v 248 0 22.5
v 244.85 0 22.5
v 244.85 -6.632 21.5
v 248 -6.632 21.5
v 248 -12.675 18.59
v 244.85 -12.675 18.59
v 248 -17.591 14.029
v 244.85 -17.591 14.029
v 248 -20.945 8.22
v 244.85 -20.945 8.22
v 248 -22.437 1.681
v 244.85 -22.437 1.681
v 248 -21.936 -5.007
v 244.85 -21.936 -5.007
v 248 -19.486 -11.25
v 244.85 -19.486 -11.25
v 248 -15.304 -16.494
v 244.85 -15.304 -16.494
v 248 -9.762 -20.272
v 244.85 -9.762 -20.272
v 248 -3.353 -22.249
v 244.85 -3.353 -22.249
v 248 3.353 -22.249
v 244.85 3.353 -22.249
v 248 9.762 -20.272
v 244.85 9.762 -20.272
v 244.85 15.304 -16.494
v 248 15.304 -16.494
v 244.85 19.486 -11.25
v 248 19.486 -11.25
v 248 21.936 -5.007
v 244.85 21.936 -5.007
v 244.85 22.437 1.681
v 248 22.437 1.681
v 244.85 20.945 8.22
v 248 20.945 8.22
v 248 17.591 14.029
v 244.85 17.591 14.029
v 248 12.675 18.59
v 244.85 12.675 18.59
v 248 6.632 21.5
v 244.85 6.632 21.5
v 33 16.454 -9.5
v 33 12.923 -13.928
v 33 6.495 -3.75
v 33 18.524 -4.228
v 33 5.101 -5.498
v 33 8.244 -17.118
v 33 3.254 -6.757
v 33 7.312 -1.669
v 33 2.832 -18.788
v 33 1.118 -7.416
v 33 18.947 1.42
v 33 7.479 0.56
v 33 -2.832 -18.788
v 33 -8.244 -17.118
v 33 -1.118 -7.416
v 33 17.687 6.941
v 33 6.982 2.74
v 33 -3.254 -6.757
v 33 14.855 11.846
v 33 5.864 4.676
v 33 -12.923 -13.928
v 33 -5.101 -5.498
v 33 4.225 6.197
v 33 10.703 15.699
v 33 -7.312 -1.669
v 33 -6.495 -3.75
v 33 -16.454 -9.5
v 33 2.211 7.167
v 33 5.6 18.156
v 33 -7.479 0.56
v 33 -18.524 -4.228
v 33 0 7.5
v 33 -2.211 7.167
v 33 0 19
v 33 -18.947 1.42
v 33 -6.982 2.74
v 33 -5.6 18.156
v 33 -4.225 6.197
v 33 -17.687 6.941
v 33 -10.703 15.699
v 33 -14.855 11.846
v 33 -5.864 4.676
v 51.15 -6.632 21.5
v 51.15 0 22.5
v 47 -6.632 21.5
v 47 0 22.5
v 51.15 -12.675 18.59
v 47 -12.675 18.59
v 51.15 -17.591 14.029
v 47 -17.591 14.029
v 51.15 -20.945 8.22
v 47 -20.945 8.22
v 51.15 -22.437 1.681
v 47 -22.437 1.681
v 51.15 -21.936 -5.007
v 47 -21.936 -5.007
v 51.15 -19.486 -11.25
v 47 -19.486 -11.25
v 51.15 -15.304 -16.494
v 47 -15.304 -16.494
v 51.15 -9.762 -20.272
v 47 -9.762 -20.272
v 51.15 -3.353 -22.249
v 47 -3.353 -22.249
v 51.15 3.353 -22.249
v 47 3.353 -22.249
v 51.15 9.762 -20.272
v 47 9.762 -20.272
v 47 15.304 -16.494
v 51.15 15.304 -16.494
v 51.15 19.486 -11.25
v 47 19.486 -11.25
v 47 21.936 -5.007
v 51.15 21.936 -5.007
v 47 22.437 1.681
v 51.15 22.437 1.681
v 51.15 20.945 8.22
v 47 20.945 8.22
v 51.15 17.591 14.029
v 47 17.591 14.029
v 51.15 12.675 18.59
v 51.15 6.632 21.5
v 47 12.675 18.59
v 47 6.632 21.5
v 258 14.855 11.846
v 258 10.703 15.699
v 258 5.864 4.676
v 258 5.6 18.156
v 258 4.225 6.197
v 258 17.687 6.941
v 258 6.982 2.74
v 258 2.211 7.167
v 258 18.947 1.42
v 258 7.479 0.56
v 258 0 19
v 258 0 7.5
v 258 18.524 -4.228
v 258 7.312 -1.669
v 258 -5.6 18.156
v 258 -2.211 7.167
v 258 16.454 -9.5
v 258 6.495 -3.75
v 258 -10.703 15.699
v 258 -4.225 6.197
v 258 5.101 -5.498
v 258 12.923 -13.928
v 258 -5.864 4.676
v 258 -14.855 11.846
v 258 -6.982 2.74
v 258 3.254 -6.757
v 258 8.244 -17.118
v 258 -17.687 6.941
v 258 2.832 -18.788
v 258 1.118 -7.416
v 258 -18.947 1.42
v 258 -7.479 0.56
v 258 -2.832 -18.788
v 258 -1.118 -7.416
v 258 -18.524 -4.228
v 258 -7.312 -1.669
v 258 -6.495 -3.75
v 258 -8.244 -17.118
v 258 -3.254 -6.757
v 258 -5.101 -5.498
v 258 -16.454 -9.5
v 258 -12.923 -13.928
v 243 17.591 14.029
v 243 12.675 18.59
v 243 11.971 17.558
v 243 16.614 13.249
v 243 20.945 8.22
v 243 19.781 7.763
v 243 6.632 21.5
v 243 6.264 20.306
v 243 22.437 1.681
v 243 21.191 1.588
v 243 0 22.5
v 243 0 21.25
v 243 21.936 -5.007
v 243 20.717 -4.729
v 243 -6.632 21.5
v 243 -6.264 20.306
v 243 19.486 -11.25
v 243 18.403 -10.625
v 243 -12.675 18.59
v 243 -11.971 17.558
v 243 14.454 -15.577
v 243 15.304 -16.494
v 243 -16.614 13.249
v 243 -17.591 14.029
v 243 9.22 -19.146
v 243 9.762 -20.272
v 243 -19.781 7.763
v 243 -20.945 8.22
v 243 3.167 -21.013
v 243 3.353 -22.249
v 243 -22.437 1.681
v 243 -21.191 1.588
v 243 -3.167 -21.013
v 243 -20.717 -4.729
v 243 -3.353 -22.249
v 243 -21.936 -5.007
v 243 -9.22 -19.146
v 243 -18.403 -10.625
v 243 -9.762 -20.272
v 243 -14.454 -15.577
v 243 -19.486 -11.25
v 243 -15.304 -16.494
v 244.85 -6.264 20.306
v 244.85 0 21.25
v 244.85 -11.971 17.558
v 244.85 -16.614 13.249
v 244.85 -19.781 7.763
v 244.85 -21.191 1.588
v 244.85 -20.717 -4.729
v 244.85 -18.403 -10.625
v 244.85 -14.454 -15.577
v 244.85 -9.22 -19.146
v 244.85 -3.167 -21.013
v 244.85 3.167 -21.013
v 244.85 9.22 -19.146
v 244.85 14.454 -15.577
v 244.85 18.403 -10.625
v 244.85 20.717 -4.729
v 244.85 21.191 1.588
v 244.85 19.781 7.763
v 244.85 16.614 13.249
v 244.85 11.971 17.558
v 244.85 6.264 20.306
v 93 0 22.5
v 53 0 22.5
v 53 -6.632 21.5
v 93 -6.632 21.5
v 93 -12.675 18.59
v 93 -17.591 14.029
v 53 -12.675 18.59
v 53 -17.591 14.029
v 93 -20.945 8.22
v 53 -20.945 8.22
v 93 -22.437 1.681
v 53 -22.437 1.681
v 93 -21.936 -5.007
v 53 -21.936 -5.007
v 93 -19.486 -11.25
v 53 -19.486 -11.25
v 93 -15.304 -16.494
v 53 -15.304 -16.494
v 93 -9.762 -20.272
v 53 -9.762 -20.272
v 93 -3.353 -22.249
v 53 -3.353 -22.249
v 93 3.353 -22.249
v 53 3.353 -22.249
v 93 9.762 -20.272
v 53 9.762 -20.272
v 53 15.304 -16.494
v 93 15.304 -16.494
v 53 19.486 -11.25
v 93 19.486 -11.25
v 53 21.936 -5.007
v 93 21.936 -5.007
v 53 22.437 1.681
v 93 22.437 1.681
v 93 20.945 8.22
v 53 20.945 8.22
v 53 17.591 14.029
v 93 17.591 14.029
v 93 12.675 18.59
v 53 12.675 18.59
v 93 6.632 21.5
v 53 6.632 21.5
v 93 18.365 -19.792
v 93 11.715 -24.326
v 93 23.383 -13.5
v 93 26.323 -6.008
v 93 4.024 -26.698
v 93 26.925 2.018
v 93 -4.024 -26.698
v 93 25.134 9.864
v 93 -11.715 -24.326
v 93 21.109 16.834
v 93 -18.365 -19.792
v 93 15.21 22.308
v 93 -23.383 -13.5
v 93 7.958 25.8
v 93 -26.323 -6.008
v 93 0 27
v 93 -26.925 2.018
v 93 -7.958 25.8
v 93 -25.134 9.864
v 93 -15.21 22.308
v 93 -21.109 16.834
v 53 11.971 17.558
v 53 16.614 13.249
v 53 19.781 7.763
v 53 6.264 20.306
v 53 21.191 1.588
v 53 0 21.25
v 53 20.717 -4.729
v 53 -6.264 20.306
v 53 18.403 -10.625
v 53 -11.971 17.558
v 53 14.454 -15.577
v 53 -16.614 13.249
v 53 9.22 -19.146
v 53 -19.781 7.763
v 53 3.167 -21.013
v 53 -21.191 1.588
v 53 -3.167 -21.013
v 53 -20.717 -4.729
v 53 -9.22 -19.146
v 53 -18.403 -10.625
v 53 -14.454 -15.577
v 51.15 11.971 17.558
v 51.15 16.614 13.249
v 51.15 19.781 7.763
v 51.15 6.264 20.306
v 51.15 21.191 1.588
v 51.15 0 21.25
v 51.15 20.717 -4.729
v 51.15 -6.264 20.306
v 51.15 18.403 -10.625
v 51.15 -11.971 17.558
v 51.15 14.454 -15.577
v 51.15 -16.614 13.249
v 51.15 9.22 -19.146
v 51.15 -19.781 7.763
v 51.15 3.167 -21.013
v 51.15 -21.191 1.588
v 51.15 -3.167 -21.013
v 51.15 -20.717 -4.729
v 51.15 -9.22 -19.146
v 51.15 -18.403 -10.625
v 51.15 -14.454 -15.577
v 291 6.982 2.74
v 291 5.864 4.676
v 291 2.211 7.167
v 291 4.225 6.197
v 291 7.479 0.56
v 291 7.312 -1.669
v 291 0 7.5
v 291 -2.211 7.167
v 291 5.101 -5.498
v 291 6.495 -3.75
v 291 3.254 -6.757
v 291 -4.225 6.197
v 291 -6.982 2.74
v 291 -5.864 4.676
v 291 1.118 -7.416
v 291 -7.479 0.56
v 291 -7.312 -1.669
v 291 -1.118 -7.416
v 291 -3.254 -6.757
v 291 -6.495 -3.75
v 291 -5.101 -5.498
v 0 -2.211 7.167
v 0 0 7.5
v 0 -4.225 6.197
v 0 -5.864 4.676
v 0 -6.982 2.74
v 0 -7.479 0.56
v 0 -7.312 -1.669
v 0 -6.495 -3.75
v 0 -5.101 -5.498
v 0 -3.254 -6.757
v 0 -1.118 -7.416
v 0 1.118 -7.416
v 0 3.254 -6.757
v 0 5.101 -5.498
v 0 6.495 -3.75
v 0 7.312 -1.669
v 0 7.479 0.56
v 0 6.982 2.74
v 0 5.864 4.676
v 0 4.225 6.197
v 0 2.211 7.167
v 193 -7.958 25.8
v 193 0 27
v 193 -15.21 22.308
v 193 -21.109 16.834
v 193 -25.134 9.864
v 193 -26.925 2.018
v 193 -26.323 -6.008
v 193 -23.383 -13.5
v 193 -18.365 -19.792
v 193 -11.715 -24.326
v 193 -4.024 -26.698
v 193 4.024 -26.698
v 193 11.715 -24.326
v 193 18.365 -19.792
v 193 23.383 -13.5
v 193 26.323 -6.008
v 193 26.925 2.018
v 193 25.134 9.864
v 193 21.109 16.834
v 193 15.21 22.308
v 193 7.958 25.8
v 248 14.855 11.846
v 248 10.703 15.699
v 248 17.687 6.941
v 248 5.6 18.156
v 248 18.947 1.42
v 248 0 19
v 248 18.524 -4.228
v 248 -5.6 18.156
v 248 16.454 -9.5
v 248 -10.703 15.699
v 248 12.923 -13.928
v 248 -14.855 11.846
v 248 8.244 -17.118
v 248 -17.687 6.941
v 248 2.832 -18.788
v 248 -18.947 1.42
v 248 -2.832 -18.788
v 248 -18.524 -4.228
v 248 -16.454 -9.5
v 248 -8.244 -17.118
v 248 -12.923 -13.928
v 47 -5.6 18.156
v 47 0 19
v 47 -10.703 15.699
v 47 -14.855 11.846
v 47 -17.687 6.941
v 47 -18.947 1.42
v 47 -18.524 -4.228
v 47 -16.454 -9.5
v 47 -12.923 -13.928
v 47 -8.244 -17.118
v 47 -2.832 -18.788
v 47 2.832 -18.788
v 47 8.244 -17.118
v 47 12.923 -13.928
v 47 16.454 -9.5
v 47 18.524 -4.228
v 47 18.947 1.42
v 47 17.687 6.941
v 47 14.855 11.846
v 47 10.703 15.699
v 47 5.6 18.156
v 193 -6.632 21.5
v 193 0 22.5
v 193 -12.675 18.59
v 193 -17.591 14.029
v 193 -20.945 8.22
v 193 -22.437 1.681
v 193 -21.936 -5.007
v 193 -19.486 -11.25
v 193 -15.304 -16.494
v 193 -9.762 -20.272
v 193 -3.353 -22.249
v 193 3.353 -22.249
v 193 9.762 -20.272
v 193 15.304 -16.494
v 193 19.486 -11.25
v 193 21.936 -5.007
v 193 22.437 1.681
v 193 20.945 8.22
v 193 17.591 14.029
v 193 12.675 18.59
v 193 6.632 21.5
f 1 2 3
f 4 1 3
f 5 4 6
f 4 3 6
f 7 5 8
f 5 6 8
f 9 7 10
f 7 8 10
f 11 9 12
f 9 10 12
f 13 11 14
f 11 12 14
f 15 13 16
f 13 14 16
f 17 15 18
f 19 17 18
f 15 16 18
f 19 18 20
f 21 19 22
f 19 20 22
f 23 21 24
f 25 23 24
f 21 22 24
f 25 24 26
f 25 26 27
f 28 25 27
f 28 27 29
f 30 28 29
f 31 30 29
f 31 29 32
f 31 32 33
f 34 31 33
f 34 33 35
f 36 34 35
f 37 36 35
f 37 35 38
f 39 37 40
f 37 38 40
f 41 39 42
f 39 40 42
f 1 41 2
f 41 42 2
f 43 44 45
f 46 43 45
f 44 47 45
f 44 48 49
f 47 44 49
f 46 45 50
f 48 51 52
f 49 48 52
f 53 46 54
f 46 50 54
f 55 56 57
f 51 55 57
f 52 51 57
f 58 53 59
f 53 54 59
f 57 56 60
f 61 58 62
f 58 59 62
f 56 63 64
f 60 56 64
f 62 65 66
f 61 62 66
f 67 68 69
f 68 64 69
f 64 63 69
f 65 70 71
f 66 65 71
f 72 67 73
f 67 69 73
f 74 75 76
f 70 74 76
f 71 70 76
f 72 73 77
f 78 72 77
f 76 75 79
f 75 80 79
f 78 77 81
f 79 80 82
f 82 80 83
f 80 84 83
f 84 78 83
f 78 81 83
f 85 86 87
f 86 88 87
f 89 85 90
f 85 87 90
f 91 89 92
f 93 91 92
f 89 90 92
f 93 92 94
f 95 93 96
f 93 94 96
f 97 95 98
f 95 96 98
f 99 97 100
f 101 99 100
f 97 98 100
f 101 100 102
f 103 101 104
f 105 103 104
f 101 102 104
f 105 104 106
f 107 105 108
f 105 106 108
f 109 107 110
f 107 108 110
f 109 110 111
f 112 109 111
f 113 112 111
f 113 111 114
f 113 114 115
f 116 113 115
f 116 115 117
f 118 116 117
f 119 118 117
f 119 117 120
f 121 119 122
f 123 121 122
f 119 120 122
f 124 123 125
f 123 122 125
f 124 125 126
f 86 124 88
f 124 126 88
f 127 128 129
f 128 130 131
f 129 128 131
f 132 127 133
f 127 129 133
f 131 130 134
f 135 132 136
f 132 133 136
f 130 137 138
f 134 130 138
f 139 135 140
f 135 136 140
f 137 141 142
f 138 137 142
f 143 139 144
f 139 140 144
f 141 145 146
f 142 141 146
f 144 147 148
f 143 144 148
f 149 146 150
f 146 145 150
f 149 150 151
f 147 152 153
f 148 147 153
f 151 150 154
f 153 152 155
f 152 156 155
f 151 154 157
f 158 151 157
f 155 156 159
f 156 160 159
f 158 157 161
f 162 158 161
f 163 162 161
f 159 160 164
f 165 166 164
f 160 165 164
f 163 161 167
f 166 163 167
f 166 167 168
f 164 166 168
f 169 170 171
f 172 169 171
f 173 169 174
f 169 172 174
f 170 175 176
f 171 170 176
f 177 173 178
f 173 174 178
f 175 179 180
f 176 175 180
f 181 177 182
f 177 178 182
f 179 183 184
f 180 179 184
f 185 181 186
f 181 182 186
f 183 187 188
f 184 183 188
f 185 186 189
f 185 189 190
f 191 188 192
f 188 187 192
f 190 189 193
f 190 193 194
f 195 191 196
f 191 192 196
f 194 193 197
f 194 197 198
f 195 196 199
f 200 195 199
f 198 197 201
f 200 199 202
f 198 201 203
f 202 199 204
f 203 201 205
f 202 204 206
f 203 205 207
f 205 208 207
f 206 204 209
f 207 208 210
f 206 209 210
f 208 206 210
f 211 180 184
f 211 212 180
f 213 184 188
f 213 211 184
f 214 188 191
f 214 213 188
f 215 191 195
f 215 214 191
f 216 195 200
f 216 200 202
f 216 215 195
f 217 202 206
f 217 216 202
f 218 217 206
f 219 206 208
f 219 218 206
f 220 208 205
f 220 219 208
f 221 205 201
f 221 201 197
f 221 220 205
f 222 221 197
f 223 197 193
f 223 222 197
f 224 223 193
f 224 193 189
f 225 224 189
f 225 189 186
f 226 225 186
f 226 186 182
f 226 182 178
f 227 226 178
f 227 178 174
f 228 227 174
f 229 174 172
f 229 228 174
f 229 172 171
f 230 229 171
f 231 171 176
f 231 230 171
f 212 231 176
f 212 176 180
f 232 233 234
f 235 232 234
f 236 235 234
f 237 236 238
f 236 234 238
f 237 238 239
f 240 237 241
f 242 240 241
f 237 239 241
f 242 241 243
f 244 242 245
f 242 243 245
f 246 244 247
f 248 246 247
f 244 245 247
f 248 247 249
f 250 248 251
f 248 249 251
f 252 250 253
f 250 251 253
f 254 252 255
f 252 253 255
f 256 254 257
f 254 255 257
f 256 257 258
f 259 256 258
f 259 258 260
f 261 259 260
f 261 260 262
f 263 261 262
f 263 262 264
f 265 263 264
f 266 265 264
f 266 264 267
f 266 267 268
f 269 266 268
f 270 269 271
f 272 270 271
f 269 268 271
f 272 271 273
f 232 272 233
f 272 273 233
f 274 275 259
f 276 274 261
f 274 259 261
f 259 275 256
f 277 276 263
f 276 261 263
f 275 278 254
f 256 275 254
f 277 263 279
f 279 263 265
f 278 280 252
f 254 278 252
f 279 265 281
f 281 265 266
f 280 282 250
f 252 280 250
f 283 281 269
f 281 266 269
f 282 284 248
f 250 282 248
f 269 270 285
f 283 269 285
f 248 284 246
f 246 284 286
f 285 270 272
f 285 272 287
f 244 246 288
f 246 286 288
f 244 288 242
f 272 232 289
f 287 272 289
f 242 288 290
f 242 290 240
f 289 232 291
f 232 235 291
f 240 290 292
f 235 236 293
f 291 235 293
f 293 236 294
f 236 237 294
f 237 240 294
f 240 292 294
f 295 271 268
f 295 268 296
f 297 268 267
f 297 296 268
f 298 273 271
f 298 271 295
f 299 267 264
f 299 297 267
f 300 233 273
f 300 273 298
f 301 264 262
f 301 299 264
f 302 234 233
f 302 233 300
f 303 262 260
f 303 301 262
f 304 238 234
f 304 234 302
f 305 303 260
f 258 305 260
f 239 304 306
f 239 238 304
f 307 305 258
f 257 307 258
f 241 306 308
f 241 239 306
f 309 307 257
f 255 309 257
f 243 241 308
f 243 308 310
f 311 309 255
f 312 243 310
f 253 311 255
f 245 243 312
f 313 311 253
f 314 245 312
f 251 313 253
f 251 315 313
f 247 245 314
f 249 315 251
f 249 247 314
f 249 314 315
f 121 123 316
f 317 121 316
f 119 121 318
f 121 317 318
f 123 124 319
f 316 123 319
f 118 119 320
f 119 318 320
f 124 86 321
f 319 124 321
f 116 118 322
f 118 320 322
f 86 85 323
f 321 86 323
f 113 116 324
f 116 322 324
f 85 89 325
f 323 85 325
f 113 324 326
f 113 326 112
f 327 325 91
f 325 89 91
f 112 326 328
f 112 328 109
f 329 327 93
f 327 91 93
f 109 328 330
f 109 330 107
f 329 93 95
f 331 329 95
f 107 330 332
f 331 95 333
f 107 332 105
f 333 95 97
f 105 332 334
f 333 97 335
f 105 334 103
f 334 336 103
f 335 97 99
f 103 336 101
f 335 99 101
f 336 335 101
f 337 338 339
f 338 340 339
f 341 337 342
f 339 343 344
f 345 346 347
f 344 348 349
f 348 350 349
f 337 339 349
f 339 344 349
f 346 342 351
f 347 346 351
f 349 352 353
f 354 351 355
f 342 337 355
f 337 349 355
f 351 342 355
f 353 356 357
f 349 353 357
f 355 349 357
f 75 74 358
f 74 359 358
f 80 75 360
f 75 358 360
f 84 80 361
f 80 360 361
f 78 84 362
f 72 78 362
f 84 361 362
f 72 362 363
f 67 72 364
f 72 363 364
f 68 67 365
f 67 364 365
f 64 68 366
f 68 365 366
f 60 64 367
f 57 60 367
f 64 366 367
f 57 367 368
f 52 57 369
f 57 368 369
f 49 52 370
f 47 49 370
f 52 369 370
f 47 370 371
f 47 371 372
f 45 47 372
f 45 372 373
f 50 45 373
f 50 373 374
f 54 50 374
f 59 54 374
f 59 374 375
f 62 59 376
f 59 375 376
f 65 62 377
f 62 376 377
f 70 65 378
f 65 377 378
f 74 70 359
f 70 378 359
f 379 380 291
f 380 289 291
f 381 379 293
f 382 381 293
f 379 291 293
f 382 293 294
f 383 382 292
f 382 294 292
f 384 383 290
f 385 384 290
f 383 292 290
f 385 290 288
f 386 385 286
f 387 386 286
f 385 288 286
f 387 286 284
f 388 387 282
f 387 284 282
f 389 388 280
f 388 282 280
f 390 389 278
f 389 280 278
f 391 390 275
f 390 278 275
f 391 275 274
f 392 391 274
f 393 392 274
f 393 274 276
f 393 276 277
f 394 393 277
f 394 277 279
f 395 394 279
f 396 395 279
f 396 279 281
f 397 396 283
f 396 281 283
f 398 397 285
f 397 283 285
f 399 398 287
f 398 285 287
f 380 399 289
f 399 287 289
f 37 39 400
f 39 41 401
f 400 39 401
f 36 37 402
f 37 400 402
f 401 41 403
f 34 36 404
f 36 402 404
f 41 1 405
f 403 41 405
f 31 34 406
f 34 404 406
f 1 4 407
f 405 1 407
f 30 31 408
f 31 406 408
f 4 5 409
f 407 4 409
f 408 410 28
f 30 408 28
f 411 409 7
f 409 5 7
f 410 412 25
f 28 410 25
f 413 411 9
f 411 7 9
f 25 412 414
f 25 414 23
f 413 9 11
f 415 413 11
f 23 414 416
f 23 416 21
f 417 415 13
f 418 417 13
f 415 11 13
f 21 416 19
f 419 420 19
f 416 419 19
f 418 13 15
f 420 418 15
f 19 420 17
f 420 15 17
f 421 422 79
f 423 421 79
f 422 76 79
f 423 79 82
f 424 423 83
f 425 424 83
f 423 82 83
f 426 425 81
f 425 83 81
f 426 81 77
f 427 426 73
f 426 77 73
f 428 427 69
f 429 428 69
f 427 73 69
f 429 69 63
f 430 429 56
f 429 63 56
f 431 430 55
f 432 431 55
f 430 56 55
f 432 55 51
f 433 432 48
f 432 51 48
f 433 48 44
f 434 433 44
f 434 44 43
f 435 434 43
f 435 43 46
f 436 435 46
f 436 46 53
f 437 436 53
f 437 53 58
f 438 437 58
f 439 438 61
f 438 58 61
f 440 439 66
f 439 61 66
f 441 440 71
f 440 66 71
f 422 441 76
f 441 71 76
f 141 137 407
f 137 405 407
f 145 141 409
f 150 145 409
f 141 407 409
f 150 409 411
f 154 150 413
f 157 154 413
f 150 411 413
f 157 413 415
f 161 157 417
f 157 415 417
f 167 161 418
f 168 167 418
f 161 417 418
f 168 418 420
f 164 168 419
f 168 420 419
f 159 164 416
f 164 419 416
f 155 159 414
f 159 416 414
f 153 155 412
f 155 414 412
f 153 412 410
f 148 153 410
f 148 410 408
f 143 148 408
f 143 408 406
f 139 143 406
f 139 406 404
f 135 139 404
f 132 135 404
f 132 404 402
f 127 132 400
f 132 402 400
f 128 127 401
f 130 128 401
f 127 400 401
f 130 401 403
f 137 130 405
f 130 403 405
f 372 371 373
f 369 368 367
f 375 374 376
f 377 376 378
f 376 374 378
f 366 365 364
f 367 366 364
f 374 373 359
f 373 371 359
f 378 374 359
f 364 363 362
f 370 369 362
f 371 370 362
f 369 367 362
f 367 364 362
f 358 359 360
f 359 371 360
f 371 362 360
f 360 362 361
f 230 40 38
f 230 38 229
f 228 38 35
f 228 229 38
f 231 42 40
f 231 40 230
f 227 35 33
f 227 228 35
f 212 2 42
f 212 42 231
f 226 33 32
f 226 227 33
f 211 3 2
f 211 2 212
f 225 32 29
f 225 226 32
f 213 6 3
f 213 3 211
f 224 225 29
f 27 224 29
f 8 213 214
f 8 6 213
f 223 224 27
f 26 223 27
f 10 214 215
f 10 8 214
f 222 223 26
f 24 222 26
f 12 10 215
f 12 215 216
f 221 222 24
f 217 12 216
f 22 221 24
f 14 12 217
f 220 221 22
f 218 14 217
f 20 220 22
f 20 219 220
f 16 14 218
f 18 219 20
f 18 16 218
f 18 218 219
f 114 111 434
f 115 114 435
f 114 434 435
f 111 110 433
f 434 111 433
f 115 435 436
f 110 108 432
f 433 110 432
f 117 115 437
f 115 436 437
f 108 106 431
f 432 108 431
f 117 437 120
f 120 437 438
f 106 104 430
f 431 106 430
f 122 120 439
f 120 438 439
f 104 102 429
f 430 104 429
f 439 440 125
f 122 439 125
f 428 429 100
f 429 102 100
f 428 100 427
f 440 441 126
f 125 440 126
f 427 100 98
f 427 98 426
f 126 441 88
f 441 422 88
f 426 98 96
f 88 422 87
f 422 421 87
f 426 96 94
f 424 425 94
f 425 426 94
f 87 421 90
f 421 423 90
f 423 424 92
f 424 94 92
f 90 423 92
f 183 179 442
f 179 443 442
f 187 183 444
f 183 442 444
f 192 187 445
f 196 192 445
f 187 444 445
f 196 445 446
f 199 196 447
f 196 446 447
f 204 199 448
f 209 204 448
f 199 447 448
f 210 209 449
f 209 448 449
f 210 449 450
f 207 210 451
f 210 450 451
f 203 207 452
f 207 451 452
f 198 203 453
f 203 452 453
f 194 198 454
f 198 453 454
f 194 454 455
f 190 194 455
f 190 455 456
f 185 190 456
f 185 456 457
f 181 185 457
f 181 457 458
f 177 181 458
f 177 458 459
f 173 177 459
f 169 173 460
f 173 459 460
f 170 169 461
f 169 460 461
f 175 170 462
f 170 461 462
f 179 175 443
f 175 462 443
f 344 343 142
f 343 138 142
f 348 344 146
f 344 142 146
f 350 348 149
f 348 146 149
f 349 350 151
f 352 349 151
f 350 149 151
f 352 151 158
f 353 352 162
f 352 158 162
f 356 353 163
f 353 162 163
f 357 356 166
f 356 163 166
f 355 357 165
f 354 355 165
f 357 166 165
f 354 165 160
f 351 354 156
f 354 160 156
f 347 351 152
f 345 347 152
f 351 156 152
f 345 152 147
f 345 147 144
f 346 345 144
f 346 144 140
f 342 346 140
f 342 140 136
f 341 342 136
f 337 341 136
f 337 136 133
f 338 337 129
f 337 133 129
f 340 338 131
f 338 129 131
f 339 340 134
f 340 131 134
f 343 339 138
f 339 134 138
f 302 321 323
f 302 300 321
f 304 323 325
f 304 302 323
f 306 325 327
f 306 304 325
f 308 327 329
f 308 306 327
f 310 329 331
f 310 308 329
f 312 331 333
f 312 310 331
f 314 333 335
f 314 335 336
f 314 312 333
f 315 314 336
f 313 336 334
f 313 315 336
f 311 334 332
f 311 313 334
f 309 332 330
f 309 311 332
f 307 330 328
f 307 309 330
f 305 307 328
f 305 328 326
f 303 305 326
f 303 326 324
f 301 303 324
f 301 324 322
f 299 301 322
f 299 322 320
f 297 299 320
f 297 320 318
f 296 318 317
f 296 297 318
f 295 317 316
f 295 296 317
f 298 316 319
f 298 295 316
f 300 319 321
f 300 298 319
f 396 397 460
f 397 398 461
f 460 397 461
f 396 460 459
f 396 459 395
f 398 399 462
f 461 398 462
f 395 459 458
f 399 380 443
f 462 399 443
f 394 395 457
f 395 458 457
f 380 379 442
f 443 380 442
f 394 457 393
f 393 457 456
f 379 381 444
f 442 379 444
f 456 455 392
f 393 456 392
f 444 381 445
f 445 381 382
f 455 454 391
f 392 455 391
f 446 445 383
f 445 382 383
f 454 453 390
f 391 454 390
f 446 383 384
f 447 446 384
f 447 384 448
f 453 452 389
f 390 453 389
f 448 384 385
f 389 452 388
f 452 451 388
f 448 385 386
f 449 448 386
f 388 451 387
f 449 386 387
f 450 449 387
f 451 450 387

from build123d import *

# Parameters (mm, degrees)
SCHIZZO2_W   = 1.6
SCHIZZO2_H   = 6.8
SCHIZZO2_W_2 = 1.85
SCHIZZO2_H_2 = 1.25


with BuildPart() as part:
    # Schizzo1 → Rivoluzione1 (revolve)
    with BuildSketch(Plane.XY, mode=Mode.PRIVATE) as rivoluzione1_sk:
        Polygon((0, 0), (291, 0), (291, 7.5), (258, 7.5), (258, 19), (248, 19), (248, 22.5), (193, 22.5), (193, 27), (93, 27), (93, 22.5), (47, 22.5), (47, 19), (33, 19), (33, 7.5), (0, 7.5), align=None)
    revolve(rivoluzione1_sk.sketch.rotate(Axis((0, 0, 0), (1, 0, 0)), 90), axis=Axis((0, 0, 0), (1, 0, 0)))

    # Schizzo2 → Taglia-Rivoluzione1 (revolve, cut)
    with BuildSketch(Plane.XY, mode=Mode.PRIVATE) as taglia_rivoluzione1_sk:
        with Locations((5.2, 10.9)):
            Rectangle(SCHIZZO2_W, SCHIZZO2_H)
        with Locations((52.075, 21.875)):
            Rectangle(SCHIZZO2_W_2, SCHIZZO2_H_2)
        with Locations((243.925, 21.875)):
            Rectangle(SCHIZZO2_W_2, SCHIZZO2_H_2)
        with Locations((285.8, 10.9)):
            Rectangle(SCHIZZO2_W, SCHIZZO2_H)
    revolve(taglia_rivoluzione1_sk.sketch.rotate(Axis((0, 0, 0), (1, 0, 0)), 90), axis=Axis((0, 0, 0), (1, 0, 0)), mode=Mode.SUBTRACT)


solid = part.part
